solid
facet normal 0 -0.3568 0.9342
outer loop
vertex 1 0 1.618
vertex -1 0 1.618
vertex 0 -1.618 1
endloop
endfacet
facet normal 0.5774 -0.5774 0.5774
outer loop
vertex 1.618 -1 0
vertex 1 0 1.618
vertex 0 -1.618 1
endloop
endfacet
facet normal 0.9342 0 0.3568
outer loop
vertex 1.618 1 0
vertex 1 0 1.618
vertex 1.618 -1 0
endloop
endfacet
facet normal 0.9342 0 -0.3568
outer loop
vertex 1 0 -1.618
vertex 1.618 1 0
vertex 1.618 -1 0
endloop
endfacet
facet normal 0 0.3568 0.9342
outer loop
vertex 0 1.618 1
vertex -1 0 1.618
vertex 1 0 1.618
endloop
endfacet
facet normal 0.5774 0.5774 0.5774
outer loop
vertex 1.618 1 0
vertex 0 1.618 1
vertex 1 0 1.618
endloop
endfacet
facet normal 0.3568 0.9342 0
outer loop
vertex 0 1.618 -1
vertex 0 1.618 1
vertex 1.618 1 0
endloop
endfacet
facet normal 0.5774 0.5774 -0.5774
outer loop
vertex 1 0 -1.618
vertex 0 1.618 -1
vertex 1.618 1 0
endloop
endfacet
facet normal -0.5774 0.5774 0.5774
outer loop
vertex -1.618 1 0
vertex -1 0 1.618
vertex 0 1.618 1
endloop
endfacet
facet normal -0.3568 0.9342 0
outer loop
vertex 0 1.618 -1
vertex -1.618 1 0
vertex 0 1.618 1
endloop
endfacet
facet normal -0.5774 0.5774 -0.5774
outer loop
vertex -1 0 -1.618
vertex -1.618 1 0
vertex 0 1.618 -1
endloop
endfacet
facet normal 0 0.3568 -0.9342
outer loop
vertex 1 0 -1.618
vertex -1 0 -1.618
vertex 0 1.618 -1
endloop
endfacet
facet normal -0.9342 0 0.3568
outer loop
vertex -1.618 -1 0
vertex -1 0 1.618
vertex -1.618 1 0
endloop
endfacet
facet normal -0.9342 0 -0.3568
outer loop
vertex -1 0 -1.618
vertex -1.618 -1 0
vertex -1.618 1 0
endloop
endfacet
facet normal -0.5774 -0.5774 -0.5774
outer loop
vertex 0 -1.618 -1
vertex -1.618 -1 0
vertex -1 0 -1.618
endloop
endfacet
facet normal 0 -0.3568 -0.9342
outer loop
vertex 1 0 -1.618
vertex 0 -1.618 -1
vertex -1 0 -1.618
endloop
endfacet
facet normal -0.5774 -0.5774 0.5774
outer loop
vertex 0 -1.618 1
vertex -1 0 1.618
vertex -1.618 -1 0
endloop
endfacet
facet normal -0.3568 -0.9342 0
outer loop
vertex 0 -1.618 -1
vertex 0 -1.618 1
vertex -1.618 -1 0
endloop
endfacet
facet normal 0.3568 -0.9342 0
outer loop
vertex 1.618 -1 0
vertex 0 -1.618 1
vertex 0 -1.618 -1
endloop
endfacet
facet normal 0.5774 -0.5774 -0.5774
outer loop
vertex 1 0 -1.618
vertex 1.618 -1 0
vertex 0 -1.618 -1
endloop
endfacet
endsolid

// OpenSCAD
a=ico(1);
polyhedron(a[0],a[1]);
function ico(a=1)=
let(r=a*1.61803)[[[0,-r,a],[0,r,a],[0,r,-a],[0,-r,-a],[a,0,r],[-a,0,r],[-a,0,-r],[a,0,-r],[r,a,0],[-r,a,0],[-r,-a,0],[r,-a,0]],[[0,5,4],[0,4,11],[11,4,8],[11,8,7],[4,5,1],[4,1,8],[8,1,2],[8,2,7],[1,5,9],[1,9,2],[2,9,6],[2,6,7],[9,5,10],[9,10,6],[6,10,3],[6,3,7],[10,5,0],[10,0,3],[3,0,11],[3,11,7]]];
